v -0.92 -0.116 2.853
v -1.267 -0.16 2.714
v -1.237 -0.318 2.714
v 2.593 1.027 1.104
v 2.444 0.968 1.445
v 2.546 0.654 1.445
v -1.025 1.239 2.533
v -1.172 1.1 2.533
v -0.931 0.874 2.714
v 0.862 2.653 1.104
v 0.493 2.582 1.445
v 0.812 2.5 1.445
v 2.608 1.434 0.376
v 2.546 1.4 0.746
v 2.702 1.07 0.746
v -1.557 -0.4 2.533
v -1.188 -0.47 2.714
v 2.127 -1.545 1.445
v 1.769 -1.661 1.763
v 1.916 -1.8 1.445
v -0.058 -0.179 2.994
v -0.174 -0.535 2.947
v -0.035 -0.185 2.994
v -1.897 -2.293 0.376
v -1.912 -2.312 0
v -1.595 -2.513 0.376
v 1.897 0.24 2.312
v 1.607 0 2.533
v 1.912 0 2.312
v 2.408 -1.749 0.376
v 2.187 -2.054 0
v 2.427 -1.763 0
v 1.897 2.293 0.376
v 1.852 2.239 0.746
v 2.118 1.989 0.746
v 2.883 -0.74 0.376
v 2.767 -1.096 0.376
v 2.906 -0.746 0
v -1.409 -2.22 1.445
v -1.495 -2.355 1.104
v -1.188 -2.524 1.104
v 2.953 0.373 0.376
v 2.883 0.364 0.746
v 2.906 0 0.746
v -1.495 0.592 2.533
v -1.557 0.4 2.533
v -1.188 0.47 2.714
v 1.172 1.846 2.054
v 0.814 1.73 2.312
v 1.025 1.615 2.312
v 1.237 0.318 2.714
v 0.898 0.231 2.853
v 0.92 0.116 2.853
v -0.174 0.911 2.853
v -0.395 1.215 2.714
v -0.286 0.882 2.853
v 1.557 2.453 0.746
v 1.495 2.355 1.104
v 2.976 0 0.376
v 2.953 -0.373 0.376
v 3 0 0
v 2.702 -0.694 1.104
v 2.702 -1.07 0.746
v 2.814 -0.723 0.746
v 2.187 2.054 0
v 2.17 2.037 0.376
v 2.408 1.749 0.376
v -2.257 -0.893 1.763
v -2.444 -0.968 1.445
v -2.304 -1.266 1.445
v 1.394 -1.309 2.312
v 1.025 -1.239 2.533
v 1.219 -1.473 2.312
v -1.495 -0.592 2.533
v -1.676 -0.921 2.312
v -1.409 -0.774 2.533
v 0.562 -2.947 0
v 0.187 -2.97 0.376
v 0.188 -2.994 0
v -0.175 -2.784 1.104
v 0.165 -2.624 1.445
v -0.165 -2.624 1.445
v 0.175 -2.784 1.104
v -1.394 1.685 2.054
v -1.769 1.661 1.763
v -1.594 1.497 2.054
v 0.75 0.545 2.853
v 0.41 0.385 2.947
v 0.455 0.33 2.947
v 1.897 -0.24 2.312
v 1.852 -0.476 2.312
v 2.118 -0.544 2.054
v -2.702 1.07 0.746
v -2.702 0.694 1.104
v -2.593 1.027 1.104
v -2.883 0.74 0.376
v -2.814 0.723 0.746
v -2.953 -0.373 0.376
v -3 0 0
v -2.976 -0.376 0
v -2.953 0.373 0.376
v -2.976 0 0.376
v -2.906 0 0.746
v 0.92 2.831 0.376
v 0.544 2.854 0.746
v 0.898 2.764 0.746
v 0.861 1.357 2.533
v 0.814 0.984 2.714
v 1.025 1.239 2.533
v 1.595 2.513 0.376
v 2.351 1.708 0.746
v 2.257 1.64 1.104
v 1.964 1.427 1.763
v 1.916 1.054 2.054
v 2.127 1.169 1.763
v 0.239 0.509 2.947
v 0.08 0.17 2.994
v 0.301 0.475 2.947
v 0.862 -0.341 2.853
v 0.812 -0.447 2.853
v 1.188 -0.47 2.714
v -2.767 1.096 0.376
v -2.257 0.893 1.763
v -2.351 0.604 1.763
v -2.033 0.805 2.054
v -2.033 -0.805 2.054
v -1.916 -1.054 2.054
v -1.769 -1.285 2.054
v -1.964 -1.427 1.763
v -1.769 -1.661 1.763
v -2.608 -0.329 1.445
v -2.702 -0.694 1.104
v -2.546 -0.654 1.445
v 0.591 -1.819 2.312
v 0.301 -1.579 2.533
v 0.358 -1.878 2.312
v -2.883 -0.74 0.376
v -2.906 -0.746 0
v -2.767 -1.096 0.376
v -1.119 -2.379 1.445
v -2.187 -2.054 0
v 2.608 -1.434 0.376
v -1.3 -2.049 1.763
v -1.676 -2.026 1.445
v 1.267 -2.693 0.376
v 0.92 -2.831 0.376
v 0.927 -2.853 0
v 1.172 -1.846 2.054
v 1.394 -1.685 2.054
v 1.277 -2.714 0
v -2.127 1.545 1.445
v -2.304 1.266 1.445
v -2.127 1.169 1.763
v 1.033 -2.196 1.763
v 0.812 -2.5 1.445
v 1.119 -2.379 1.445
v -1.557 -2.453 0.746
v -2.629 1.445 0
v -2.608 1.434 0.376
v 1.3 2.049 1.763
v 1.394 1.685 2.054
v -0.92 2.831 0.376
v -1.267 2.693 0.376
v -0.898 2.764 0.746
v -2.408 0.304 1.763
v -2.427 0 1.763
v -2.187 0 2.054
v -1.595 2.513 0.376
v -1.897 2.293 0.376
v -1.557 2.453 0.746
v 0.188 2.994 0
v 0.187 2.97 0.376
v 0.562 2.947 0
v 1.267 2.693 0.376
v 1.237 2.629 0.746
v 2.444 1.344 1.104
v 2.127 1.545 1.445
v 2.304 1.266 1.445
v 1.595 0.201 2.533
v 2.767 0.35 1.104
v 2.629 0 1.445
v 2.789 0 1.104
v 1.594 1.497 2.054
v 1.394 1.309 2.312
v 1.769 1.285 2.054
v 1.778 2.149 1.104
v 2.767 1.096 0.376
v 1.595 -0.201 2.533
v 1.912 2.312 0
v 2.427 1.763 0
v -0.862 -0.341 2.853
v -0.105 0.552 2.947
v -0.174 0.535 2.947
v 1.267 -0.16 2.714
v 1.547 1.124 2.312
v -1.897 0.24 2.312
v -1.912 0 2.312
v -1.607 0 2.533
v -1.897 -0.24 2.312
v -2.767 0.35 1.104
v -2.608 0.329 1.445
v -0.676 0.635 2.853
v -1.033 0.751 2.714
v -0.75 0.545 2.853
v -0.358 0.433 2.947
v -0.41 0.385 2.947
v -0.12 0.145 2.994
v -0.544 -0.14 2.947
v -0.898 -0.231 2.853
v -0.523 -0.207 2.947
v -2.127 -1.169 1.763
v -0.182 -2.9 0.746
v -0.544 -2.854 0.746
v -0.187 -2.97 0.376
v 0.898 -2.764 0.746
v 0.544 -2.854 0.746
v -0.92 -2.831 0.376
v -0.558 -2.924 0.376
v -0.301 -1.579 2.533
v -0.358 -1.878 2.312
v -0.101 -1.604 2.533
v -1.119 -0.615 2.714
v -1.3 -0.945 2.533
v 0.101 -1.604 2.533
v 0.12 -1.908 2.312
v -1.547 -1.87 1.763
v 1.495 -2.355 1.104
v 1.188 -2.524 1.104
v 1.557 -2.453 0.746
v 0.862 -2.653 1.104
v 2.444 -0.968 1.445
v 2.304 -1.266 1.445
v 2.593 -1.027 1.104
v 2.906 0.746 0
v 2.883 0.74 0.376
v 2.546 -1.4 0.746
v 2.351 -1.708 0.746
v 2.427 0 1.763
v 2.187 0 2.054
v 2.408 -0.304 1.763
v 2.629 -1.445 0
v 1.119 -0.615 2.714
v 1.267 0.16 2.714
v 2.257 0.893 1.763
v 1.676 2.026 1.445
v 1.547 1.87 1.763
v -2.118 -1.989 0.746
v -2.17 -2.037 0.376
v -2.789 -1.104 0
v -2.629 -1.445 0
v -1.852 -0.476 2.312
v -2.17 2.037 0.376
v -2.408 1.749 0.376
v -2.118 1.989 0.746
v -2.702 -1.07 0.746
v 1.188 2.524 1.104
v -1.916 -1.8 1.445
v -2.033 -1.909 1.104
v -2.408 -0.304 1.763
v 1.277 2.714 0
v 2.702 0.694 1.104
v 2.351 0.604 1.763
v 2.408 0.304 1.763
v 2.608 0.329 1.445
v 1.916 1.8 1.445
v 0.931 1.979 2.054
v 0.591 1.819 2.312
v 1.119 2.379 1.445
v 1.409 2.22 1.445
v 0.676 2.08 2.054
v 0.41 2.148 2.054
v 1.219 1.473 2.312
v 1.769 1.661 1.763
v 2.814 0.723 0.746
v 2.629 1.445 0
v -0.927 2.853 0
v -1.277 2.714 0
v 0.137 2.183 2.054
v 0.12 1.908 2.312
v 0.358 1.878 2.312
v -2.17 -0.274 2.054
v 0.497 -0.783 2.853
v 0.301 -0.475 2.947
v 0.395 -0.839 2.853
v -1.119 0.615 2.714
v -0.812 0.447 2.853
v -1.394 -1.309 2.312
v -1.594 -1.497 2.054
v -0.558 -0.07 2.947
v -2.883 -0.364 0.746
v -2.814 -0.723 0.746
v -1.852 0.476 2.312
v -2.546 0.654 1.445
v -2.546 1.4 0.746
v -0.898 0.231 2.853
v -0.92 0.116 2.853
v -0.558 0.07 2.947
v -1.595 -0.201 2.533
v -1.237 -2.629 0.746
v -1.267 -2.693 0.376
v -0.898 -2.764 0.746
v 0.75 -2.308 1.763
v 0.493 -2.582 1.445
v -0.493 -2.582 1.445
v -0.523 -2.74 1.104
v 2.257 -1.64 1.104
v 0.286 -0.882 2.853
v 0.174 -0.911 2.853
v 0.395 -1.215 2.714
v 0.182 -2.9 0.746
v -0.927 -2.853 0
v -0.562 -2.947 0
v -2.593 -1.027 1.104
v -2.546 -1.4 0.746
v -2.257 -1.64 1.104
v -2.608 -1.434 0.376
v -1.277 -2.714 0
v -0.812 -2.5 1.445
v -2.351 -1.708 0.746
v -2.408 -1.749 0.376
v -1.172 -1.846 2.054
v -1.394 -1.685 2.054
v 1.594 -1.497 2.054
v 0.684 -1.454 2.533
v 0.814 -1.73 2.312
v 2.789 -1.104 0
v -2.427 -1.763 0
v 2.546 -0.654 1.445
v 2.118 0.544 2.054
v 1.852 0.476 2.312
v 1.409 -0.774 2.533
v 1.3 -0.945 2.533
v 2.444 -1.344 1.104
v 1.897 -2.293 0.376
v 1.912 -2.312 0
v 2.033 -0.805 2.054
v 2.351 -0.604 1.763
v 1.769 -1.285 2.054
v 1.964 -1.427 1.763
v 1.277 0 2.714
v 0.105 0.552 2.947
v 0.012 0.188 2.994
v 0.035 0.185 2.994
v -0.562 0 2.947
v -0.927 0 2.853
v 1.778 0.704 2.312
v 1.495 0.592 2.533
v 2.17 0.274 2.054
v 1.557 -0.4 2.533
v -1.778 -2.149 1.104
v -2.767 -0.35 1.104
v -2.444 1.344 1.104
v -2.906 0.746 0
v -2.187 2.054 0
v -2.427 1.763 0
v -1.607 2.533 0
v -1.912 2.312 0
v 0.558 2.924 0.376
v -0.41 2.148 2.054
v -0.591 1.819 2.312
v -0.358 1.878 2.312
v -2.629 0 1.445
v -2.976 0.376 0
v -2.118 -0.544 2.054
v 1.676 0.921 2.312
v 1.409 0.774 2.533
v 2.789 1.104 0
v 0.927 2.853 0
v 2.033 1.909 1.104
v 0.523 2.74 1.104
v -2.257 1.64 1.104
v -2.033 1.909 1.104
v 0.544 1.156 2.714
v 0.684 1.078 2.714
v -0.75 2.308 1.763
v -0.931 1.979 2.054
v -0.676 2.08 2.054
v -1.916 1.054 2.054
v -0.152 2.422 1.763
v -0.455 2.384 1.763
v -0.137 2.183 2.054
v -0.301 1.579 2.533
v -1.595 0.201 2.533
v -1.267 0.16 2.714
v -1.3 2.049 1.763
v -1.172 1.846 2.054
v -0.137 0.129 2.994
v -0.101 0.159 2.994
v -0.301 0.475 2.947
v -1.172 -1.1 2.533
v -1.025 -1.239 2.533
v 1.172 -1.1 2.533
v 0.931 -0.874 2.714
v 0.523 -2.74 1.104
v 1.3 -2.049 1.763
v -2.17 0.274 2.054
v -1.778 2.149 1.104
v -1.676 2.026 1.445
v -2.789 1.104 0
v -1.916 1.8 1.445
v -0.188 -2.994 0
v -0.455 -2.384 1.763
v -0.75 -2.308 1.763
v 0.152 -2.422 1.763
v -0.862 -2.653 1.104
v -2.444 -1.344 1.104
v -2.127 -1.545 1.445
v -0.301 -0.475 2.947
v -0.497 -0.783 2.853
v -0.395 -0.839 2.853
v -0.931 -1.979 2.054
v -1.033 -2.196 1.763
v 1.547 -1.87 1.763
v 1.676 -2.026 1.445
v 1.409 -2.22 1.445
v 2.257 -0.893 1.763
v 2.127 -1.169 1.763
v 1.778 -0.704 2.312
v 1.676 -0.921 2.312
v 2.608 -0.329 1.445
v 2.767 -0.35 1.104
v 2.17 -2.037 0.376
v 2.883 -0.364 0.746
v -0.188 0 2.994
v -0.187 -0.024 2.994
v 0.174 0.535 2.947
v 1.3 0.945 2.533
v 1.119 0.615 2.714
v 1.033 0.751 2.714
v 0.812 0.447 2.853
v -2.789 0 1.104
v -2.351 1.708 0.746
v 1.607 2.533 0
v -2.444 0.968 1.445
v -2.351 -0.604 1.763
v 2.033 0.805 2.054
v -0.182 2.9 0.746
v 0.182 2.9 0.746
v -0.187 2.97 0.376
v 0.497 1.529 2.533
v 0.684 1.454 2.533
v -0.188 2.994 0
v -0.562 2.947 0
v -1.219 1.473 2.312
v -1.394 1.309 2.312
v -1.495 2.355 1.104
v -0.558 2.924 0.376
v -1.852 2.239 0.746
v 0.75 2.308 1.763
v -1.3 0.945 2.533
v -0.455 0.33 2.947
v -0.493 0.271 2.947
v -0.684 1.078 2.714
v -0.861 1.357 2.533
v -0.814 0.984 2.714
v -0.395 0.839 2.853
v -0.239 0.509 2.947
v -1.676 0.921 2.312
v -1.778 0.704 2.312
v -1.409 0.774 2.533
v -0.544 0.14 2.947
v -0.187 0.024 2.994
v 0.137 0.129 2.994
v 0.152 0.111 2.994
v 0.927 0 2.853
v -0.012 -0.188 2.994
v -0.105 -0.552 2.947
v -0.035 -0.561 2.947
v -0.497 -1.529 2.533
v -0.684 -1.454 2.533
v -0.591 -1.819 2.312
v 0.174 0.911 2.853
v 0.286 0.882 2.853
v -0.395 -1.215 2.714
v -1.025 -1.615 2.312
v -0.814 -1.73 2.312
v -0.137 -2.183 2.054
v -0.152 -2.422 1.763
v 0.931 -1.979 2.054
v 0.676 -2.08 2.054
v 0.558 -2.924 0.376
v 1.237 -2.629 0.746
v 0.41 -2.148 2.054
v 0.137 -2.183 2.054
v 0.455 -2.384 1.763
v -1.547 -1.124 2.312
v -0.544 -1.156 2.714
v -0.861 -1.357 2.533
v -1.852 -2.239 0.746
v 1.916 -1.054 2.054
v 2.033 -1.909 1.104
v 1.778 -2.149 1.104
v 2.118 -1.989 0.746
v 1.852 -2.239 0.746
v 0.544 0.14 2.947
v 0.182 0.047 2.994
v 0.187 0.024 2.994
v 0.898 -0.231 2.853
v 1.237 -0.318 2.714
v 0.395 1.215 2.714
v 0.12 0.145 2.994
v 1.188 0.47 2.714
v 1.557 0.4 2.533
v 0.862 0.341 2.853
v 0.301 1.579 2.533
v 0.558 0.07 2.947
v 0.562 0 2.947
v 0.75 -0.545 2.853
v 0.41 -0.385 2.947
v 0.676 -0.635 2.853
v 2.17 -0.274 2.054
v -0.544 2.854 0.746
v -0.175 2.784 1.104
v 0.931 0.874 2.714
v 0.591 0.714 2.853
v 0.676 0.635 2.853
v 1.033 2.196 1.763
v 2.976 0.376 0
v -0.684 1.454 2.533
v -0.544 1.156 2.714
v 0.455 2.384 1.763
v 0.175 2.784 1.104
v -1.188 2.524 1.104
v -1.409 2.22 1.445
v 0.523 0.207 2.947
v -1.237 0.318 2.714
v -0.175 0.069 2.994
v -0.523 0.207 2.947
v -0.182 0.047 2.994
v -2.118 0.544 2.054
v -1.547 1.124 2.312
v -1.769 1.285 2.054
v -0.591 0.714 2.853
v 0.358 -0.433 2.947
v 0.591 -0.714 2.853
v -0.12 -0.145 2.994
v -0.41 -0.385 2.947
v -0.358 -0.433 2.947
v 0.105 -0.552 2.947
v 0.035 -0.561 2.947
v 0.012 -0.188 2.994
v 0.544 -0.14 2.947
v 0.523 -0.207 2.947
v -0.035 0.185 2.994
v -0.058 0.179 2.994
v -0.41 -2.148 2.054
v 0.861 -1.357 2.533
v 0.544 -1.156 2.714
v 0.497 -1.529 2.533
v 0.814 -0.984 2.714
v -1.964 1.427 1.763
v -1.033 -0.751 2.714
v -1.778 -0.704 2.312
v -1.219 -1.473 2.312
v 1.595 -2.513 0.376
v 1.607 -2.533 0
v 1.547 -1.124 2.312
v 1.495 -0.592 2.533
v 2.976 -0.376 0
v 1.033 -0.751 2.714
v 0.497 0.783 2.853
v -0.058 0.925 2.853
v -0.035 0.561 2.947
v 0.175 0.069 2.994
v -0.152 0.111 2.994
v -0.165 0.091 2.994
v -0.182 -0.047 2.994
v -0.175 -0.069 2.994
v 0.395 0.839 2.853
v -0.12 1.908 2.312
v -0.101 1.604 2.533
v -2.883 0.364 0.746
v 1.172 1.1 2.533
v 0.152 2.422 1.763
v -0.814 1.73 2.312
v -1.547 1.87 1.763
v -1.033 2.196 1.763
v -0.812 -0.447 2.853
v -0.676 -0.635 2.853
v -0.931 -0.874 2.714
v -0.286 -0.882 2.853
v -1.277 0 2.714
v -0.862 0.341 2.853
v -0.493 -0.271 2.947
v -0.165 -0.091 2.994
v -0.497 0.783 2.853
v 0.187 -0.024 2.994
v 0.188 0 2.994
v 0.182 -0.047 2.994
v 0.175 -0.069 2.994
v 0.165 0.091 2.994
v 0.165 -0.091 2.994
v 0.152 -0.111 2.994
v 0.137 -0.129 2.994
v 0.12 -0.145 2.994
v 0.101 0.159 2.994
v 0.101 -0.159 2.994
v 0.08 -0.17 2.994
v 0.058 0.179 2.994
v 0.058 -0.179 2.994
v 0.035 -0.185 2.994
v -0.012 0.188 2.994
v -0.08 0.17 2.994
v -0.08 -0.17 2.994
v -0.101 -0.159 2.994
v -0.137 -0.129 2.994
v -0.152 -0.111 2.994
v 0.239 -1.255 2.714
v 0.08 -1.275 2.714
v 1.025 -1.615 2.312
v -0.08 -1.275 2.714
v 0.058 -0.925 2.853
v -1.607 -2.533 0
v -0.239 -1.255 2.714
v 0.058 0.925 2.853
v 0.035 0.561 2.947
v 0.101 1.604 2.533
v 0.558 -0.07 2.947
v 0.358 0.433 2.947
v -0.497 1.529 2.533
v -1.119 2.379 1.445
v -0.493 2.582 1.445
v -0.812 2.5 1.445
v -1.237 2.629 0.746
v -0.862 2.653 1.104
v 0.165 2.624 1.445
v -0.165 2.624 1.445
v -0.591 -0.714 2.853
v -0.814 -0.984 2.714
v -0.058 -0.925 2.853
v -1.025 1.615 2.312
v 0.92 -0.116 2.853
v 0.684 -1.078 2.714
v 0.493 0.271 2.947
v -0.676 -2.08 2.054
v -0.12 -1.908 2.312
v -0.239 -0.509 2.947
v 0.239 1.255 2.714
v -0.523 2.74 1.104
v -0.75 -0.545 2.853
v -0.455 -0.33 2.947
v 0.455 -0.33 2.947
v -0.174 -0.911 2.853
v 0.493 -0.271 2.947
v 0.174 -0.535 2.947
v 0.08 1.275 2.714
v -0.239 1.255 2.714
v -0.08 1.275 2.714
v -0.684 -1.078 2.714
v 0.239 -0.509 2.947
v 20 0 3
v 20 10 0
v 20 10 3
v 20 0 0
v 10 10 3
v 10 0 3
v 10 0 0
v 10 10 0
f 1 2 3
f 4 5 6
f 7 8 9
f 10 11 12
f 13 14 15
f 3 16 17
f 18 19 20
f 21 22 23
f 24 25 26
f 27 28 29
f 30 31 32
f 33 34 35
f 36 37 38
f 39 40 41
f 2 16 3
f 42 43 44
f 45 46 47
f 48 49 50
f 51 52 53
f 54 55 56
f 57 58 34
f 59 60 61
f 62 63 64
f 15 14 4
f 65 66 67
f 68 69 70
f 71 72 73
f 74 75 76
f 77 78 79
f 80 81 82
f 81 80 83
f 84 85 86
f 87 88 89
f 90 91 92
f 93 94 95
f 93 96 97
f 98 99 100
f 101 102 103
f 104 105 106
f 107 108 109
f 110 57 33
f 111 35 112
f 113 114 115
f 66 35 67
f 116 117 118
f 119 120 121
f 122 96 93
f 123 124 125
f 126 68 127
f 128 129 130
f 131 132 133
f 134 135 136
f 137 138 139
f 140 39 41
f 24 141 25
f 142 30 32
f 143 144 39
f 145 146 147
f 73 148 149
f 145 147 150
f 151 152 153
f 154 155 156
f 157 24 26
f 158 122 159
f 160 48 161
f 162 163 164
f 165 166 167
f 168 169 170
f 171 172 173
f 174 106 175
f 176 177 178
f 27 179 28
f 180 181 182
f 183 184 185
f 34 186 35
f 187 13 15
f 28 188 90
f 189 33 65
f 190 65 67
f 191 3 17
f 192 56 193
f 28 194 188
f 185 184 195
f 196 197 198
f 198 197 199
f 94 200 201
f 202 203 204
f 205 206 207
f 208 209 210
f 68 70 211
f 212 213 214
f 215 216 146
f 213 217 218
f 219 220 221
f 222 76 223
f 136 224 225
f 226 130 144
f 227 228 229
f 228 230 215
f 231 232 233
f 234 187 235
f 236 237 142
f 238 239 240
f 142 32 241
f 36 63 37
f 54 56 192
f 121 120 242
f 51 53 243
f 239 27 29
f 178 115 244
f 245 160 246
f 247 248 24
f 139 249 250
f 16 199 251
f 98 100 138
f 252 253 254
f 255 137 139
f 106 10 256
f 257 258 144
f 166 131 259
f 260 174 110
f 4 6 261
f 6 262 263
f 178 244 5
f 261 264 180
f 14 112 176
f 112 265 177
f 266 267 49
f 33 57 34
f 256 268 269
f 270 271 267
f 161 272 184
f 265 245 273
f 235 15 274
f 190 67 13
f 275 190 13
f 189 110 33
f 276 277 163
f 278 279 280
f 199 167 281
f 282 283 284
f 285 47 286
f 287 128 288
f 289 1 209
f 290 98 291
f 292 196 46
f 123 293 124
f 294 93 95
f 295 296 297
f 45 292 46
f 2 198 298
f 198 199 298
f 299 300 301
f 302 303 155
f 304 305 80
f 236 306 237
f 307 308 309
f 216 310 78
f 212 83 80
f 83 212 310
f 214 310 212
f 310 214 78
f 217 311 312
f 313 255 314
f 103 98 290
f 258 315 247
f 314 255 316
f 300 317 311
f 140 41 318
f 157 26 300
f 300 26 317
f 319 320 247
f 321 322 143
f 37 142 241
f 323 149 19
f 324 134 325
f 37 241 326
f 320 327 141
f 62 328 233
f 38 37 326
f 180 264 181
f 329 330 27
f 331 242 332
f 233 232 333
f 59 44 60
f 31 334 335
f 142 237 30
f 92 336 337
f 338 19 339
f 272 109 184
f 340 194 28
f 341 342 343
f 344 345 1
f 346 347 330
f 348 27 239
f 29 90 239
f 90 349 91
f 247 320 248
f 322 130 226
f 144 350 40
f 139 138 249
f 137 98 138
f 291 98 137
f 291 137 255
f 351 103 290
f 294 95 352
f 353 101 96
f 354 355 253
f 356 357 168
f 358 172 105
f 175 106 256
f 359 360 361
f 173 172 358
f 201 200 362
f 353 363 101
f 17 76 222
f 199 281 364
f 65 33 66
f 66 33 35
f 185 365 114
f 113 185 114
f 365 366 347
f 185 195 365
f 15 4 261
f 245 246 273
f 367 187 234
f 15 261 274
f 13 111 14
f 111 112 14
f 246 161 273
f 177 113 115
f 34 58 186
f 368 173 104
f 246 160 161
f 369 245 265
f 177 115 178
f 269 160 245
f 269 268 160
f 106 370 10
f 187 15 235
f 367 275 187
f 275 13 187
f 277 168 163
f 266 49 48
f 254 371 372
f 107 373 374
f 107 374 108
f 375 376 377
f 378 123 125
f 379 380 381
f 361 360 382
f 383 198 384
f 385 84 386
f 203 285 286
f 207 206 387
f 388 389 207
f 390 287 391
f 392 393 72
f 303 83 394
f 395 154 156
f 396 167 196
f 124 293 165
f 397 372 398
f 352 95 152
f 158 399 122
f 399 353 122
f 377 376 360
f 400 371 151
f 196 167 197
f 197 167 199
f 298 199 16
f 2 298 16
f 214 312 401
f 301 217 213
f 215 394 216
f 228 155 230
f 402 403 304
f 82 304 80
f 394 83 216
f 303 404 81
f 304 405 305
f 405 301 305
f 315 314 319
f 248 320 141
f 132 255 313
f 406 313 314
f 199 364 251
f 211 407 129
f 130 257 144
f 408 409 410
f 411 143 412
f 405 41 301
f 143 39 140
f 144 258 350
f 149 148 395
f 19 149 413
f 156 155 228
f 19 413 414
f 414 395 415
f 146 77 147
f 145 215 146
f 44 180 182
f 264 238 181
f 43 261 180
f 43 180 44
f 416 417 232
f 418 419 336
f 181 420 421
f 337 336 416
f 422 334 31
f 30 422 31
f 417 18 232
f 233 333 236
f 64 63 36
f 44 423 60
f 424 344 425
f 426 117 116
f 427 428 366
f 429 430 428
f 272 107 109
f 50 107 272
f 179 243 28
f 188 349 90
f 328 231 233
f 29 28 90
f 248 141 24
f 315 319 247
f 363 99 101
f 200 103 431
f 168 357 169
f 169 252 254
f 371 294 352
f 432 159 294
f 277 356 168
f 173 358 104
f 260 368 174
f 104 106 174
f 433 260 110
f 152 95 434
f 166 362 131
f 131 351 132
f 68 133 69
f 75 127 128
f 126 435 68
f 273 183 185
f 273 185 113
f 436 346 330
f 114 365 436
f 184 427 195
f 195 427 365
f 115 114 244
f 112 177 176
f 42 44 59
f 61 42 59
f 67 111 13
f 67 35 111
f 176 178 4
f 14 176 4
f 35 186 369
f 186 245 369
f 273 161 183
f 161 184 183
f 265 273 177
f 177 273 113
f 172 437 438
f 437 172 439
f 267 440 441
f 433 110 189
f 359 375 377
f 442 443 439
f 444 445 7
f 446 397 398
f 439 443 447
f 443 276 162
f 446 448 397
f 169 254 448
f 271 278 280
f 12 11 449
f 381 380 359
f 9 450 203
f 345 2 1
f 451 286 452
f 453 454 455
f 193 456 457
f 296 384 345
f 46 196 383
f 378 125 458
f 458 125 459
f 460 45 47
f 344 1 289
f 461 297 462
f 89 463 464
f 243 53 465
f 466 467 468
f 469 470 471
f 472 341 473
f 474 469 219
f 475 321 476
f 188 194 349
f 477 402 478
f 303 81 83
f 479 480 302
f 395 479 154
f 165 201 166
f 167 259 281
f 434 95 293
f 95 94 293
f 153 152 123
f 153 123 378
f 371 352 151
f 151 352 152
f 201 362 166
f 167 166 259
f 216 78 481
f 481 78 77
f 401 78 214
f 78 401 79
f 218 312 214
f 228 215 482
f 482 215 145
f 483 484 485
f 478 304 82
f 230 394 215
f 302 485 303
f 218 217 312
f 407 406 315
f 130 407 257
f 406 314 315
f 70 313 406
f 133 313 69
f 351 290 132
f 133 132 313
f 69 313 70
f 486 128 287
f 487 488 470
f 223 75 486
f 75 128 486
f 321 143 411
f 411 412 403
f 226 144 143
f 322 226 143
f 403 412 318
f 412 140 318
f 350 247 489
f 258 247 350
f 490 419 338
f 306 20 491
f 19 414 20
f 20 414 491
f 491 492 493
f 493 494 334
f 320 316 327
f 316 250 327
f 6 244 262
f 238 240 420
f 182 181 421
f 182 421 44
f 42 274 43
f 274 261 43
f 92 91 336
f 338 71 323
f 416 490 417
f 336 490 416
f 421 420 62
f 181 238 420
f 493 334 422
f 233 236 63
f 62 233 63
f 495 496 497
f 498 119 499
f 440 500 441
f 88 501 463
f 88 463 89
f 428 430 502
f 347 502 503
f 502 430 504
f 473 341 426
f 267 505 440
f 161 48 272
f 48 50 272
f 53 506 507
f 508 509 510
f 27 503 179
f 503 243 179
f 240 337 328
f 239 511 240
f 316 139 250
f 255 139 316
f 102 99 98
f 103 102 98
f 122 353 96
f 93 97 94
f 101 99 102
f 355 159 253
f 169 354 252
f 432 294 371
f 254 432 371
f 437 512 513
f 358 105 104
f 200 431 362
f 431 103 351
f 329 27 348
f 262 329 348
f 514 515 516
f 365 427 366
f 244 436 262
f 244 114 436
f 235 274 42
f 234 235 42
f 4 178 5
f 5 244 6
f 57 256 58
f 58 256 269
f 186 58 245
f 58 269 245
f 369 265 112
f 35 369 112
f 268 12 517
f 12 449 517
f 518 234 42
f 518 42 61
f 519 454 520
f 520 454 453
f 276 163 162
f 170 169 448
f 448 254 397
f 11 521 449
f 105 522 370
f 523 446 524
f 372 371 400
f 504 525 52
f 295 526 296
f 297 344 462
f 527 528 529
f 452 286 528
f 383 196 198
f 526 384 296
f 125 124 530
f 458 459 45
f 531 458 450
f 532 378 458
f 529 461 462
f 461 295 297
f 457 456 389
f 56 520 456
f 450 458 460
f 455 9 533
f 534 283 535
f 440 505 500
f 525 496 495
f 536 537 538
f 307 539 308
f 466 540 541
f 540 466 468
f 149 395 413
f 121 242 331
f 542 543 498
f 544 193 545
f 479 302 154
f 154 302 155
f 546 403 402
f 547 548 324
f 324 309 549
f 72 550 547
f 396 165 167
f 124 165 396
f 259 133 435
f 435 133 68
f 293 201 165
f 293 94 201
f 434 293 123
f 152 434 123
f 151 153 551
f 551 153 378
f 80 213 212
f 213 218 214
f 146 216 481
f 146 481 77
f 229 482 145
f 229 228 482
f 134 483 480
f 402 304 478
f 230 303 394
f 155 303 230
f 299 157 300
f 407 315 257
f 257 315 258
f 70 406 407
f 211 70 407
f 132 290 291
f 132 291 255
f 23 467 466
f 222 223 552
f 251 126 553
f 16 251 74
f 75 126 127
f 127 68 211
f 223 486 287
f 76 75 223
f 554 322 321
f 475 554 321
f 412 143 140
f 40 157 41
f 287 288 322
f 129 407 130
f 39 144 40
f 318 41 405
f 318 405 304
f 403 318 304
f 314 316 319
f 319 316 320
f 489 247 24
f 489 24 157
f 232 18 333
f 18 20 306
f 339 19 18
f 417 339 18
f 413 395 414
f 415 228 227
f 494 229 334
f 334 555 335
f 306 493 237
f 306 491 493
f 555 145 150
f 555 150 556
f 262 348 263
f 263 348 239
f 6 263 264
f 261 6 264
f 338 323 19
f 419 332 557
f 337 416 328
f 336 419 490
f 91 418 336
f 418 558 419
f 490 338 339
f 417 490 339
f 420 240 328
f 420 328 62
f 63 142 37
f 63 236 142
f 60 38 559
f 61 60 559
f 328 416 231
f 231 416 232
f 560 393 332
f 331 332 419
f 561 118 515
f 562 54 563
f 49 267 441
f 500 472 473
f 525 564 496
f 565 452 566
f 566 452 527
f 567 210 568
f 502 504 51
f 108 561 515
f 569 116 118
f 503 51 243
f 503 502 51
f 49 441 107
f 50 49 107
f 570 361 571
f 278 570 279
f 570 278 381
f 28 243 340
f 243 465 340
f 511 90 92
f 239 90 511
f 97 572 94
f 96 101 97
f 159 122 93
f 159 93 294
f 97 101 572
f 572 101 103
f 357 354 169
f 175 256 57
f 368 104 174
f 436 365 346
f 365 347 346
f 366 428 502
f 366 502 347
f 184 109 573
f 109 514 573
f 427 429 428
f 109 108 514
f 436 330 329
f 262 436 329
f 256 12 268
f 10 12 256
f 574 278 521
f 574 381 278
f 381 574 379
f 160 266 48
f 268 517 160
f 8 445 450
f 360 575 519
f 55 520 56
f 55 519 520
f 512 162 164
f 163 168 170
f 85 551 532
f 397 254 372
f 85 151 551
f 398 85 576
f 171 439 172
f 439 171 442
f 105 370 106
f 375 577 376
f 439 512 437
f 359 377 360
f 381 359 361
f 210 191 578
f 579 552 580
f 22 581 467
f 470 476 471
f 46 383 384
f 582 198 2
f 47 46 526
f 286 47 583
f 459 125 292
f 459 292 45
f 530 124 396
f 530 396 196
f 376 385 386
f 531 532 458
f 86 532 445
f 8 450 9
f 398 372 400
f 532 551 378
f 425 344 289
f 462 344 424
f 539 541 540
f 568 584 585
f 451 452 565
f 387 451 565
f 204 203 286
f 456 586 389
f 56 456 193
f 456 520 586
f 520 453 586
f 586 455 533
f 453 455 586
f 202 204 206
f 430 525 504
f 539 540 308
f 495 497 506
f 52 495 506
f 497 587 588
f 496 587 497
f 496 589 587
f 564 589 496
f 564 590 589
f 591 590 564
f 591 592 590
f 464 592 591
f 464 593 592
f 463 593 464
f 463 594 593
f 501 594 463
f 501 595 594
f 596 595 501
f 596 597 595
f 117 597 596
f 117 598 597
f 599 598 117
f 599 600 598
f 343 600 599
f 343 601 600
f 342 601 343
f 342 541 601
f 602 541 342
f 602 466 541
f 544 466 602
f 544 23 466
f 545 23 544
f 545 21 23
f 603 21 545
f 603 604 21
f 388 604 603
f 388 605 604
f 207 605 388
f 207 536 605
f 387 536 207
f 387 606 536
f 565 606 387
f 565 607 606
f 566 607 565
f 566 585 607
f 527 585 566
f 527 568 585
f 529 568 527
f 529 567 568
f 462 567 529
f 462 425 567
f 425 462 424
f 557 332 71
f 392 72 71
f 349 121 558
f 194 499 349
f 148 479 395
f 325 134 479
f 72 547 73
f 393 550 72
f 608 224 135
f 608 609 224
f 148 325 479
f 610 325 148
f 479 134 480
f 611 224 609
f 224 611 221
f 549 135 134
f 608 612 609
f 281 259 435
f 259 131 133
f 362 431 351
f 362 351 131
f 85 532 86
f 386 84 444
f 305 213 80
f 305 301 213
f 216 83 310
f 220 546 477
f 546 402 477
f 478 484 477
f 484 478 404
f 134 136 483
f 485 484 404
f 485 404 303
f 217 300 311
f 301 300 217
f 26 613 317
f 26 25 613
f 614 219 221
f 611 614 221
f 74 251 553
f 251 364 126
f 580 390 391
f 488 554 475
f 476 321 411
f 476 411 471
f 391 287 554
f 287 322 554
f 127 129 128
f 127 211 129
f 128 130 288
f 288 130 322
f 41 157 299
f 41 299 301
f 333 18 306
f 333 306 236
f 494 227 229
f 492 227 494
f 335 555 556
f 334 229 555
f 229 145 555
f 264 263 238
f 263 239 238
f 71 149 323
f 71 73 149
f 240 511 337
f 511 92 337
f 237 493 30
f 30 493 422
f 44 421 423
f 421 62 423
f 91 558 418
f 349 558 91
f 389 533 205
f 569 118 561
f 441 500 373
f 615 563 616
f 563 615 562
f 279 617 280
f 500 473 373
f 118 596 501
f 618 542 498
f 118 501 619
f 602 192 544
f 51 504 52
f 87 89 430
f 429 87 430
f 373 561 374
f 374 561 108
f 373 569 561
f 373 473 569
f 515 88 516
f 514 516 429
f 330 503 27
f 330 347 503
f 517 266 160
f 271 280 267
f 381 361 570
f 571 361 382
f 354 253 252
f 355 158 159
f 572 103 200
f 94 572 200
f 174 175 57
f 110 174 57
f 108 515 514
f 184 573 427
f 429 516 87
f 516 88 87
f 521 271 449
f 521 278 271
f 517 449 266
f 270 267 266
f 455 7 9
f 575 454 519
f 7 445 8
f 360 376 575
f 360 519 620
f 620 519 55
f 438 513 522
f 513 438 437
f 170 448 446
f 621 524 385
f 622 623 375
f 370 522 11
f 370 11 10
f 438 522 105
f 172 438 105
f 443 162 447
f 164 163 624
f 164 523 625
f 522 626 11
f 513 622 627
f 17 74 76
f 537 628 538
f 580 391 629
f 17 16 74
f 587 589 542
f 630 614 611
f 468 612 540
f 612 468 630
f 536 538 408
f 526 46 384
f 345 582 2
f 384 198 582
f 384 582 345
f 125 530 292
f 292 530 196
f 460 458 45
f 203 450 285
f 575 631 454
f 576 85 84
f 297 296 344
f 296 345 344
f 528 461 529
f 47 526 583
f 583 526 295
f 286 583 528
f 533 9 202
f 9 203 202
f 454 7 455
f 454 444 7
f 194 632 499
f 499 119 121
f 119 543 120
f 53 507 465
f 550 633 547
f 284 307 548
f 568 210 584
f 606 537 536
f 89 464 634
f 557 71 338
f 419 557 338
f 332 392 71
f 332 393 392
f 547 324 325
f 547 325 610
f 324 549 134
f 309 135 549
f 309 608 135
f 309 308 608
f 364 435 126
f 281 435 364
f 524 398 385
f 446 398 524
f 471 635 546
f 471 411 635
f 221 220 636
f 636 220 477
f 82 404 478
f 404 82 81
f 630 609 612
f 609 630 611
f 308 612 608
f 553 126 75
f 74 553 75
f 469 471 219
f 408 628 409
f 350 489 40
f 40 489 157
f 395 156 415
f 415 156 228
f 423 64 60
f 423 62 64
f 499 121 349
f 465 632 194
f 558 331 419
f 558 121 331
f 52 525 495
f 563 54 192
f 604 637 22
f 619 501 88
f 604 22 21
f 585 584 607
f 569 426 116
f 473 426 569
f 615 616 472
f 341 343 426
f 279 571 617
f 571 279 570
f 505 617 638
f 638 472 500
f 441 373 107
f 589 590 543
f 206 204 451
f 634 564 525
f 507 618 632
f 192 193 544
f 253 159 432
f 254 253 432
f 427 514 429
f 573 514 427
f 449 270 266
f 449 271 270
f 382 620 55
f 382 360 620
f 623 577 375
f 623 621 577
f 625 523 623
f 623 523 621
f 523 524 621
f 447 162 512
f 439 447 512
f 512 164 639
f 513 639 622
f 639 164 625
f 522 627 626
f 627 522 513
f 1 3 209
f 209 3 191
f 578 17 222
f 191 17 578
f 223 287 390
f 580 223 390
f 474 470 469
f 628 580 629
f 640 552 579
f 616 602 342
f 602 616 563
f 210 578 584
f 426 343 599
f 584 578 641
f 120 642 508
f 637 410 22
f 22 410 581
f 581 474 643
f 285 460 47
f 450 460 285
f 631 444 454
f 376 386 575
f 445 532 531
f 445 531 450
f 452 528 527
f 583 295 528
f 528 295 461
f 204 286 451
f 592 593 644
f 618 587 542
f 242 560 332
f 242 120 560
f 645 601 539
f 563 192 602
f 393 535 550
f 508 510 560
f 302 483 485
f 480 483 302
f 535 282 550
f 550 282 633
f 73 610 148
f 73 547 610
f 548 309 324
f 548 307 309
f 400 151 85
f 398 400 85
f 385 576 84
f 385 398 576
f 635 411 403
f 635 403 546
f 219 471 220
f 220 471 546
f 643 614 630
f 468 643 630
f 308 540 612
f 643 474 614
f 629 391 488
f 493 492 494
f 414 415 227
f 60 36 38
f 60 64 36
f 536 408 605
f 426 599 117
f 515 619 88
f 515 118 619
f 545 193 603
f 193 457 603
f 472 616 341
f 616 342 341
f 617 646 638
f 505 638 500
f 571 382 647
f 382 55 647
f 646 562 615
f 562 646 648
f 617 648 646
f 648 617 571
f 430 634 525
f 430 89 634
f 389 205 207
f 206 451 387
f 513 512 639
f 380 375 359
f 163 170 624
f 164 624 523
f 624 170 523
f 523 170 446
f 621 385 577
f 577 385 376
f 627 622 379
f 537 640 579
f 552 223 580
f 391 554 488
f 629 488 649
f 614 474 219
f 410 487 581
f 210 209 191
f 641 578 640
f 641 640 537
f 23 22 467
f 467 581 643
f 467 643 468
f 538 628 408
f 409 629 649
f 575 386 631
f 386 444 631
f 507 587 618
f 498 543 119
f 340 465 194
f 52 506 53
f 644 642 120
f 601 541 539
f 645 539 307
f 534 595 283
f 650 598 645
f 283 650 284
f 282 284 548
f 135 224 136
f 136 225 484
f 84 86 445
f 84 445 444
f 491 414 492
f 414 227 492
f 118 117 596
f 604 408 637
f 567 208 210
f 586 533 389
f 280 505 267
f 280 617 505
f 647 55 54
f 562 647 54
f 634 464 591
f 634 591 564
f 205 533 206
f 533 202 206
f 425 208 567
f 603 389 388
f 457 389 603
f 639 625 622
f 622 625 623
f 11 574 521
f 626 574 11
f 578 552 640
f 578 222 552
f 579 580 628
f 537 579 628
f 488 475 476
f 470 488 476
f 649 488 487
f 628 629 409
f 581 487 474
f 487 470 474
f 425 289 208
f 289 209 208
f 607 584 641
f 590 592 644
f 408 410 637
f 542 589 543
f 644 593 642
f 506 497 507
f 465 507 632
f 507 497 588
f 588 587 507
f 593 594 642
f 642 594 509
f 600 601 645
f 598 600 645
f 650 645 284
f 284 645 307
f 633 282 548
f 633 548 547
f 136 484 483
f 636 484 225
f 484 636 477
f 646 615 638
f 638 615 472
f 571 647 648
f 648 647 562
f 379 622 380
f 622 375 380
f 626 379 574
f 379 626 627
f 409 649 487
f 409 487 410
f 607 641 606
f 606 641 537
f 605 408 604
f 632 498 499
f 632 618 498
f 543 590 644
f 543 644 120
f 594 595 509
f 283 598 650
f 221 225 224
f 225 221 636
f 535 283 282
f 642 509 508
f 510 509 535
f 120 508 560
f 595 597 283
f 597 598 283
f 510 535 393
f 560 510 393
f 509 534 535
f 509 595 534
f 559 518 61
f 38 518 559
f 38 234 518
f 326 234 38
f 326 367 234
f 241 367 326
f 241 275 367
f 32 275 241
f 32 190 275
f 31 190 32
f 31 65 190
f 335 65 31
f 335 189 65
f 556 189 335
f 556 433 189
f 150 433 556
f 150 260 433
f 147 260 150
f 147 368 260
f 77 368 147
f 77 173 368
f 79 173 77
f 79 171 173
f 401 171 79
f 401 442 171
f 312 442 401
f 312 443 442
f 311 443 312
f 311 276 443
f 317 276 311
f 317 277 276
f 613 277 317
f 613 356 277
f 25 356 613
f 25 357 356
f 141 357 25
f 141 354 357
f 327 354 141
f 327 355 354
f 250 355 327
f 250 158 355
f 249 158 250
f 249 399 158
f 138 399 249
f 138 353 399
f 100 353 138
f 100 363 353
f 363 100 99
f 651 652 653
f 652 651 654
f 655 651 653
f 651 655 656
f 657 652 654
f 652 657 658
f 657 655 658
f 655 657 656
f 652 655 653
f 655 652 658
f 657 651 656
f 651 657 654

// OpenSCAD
// Illustrates the minkowski summation and its uses.
//
// According to the [documentation]
// (https://en.wikibooks.org/wiki/OpenSCAD_User_Manual/Transformations#minkowski),
// the summation of a cylinder and a rectangle will sum their dimensions in all
// three axes (e.g. a 10x10x2 prism summed with an OD2 x 1 cylinder results in
// a 14x14x3 prism with fillets in the plane of the cylinder.)
//
// The basic premise:
//  - Draw the two components and their minkowski sum.
//  - Show the effect of translating the objects on the location of the sum.
//
// The Minkowski Sum explained:
//  According to [Wikipedia](https://en.wikipedia.org/wiki/Minkowski_addition),
//  the minkowski sum is set addition in which each vector inside a set is7777777777777777777777777777777777777777
//  added to each vector in another set.
//
//  How does this relate to OpenSCAD? Think of each body as a 'set' of points.
//  The minkowski sum takes each point in one shape, and adds it to each point
//  in the other.
//
//  One might imagine the minkoski sum in this way:
//    For our example, the two parts are a rectangular prism and a cylinder.
//    Take the cylinder at its origin. Place the cylinder on one corner of their
//    prism. Now treat the faces of the prism as your limits, then sweep the
//    cylinder around, keeping its origin inside the limits. Any point in space
//    occupied by the cylinder while you sweep around, bumping into the edges
//    of the cylinder, is kept in the final minkowski sum.
//
//    Now if the cylinder is translated so that it doesn't touch the origin,
//    its origin is still what must remain within the bounds of the prism,
//    causing the resulting 'painted' solid to be offset from the origin as
//    well.
//
//  This should also make it clear why the minkowski slows things down so much -
//  Drawing the sum requires a computation of every point on one shape for every
//  point on the other shape, so two 10-point shapes demand 100 calculations.

// Lower the resolution to save time on calculations
$fn = 50;

// Set the [X, Y, Z] dimensions of the rectangular prism.
prismDim = [10, 10, 3];
// Set the [X, Y, Z] location of the corner of the prism.
prismTranslate = [10, 0, 0];

// Set the radius of the cylinder.
cylR = 3;
// Set the height of the cylinder.
cylH = 1;
// Set the location of the center of the bottom of the cylinder.
cylTranslate = [0, 0, 0];

// Show the prism in space. This acts as the limits of where the origin of the
// cylinder can reach when sweeping the cylinder around.
prism();
// Show the cylinder. This is the 'paint brush'.
// cyl();
halfSph();

// Show the bounds of the expected rectangle, without fillets.
// The `#` will show this part in transluscent red.
// # expectedDims();

// Draw the minkowski sum. The `%` will show the part in transluscent grey.
% minkowski(){
  prism();
  //cyl();

  // So if you did a sphere instead here, you'd get rounded corners all around.
  // The minkowski would trace the sphere from its center around the span of
  // the prism or cylinder, whichever you leave uncommented.
  //sph();
  
  // And half sphere leaves the bottom with square edges.
  //halfSph();
}

module prism() {
  // Make an orange cube.
  color([1, 0.5, 0]) translate(prismTranslate) cube(prismDim);
}

module cyl() {
  // Make a blue cylinder.
  color([0, 0.5, 1]) translate(cylTranslate) cylinder(r=cylR, h=cylH);
}

module sph() {
  sphere(r=cylR);
}

module halfSph() {
  difference(){
      sph();
      translate([-cylR,-cylR,-cylR*2])cube(cylR*2);
  }
}
  
module expectedDims() {
  // This is going to be a conglomeraton of the above dimensions.
  // The X and Y become a sum of their lengths plus the diameter of the
  // cylinder.
  X = prismDim[0] + cylR*2;
  Y = prismDim[1] + cylR*2;
  Z = prismDim[2] + cylH;

  // The origin is a sum of the origins of the two parts.
  // Offset in the XY plane to account for the radius of the cylinder.
  trans = prismTranslate + cylTranslate - [cylR, cylR, 0];

  color([0, 1, 0]) translate(trans) cube([X, Y, Z]);
}
